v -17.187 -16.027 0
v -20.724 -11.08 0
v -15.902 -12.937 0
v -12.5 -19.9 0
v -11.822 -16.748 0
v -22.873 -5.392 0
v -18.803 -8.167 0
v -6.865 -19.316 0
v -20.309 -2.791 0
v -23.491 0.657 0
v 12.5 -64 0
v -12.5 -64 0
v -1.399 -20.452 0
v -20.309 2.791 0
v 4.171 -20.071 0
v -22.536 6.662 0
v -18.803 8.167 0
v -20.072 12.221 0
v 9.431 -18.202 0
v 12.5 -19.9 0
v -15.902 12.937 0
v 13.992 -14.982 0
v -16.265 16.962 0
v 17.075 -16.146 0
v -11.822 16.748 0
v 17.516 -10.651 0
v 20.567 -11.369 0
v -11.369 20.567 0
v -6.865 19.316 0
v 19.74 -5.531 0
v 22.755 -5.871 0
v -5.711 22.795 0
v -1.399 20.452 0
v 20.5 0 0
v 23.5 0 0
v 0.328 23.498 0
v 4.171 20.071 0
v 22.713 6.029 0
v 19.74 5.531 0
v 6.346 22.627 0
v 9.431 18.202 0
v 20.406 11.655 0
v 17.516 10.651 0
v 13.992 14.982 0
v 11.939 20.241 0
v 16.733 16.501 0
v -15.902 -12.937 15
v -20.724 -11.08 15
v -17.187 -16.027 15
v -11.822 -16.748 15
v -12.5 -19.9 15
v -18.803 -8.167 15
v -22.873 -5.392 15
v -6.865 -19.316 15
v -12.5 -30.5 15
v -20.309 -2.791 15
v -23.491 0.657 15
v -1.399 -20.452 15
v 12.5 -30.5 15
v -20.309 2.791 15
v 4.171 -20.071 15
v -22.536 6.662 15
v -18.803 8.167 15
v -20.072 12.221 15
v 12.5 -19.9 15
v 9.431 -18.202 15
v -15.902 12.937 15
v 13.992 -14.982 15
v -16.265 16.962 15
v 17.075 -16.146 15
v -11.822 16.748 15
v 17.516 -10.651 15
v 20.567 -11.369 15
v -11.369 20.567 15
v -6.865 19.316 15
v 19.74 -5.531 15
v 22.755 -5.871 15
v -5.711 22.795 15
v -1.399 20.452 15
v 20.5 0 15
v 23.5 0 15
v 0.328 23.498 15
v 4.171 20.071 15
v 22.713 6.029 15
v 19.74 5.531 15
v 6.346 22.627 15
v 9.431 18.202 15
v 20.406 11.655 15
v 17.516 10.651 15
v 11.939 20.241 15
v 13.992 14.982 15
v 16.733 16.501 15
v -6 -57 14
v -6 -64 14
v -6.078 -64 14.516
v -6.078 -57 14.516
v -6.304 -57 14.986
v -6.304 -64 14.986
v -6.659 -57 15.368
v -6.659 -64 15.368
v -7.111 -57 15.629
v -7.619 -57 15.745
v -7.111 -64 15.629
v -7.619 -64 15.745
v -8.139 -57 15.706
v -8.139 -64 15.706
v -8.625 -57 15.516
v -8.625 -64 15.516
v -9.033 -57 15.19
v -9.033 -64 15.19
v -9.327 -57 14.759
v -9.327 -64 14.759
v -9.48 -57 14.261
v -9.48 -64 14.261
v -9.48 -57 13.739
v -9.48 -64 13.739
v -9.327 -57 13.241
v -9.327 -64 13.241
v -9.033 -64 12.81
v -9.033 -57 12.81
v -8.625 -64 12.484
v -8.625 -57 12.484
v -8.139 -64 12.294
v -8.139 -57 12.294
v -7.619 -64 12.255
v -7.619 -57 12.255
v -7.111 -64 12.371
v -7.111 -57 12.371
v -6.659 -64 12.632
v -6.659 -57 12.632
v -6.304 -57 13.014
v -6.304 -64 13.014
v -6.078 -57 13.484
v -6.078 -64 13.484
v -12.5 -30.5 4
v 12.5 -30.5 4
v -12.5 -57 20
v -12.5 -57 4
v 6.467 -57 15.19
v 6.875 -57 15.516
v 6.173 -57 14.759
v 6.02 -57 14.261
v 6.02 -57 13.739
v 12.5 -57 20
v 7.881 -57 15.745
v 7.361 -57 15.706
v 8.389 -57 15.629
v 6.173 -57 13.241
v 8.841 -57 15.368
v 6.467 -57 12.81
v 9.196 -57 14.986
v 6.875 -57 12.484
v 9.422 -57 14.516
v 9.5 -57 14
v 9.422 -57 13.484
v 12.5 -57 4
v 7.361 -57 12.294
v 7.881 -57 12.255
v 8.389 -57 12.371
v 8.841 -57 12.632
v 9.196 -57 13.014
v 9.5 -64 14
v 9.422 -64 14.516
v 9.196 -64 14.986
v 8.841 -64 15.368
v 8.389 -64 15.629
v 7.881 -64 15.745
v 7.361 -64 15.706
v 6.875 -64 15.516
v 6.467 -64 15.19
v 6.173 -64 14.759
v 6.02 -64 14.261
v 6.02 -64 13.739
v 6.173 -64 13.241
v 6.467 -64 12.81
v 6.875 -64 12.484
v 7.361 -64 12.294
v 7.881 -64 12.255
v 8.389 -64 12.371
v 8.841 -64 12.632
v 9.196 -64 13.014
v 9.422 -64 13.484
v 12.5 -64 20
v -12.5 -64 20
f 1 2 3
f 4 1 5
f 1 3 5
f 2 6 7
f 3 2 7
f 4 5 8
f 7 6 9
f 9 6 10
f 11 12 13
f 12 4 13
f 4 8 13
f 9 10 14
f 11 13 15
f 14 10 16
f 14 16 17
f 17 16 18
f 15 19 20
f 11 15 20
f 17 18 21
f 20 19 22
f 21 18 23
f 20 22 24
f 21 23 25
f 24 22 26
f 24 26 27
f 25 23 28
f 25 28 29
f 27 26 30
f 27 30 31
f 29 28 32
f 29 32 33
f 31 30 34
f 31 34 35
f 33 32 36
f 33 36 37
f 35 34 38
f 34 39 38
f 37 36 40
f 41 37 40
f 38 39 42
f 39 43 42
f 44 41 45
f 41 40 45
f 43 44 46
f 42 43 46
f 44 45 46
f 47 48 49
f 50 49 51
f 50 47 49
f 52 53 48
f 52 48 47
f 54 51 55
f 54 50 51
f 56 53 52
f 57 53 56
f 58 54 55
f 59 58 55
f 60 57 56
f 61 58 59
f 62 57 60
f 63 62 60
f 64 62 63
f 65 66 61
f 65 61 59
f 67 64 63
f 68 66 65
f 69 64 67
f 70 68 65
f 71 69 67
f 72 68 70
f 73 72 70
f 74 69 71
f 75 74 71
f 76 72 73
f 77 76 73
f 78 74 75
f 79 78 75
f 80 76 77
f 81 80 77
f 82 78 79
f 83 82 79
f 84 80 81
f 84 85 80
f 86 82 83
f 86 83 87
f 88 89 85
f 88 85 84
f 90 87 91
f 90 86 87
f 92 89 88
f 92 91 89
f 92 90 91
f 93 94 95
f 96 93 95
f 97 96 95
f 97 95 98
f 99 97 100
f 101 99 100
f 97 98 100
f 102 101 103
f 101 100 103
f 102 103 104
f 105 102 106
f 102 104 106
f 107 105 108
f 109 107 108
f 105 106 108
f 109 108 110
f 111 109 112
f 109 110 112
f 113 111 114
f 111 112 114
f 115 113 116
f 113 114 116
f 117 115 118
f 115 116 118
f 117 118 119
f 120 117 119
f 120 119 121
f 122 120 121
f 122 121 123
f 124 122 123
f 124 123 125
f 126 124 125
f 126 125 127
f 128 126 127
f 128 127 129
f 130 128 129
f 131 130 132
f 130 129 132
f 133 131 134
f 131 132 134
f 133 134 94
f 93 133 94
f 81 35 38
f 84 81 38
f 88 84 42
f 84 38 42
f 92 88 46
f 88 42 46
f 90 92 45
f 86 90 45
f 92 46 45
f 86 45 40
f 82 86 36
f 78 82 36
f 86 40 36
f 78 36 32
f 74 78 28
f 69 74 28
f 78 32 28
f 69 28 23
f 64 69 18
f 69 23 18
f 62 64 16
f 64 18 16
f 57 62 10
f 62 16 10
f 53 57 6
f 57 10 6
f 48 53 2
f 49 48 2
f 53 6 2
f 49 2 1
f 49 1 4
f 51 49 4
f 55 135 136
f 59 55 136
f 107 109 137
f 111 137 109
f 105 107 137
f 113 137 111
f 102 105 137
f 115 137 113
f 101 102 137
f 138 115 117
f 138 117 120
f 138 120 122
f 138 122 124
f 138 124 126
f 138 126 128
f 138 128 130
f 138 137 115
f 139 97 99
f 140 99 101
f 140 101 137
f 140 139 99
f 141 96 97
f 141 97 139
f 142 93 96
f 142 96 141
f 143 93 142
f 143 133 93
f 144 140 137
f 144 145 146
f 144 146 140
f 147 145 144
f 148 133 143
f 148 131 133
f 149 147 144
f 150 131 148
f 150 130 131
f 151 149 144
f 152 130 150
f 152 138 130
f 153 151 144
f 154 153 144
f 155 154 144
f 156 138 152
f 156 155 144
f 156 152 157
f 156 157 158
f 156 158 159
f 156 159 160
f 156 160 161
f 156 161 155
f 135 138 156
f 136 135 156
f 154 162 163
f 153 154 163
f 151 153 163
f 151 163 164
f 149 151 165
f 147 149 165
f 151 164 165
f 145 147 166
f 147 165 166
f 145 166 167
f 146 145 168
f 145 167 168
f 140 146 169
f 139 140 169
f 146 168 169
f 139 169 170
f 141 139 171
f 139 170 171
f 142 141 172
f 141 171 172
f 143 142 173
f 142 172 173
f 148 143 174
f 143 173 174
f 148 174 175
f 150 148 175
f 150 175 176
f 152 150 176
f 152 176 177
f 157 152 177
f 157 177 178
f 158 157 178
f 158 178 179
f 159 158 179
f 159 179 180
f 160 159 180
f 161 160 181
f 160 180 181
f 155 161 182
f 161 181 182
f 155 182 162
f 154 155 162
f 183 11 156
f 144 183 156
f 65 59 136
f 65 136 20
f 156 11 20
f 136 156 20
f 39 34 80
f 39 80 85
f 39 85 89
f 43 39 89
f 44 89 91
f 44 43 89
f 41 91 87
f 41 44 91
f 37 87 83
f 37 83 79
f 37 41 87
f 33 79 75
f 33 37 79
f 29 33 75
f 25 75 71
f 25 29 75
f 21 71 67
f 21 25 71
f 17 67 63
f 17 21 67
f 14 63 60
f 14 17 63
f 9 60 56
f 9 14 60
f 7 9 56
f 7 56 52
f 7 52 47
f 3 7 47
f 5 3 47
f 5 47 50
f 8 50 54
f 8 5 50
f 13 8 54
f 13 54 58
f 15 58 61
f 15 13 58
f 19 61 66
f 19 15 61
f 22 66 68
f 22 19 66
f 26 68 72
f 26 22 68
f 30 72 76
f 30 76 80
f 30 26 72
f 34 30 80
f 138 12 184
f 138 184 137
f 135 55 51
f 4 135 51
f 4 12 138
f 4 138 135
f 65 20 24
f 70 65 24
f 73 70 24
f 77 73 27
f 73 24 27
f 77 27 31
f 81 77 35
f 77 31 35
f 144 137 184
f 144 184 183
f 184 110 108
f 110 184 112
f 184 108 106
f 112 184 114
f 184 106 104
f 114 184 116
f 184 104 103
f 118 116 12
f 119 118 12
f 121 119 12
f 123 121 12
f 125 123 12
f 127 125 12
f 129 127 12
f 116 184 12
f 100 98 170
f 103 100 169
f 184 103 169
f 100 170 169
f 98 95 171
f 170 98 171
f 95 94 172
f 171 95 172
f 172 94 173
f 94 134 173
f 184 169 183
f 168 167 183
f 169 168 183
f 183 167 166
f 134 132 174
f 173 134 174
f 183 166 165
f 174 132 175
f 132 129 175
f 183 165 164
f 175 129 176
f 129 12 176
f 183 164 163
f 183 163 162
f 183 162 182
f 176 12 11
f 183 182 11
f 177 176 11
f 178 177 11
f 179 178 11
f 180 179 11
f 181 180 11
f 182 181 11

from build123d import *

# Parameters (mm, degrees)
F0_R     = 20.5
F1_DEPTH = 15
F0_W     = 25
F0_H     = 26.5
F2_DEPTH = 4
F0_H_2   = 7
F3_DEPTH = 20
F4_R     = 1.75
F5_DEPTH = 7


# Not quite as in the source:
# - a feature names something its author has since deleted; it is built from what else it names


with BuildPart() as f1:
    # F0 (on Top) → F1 (new body)
    with BuildSketch(Plane.XY):
        with BuildLine():
            ThreePointArc((12.5, -19.8997487421), (0, -23.5), (-12.5, -19.8997487421))
            Line((-12.5, -19.8997487421), (-12.5, -30.5))
            Line((-12.5, -30.5), (12.5, -30.5))
            Line((12.5, -30.5), (12.5, -19.8997487421))
        make_face()
        with BuildLine():
            ThreePointArc((23.5, 0), (-11.3688170009, 20.5669638012), (-12.5, -19.8997487421))
            ThreePointArc((-12.5, -19.8997487421), (0, -23.5), (12.5, -19.8997487421))
            ThreePointArc((12.5, -19.8997487421), (20.5669638012, -11.3688170009), (23.5, 0))
        make_face()
        Circle(F0_R, mode=Mode.SUBTRACT)
    extrude(amount=F1_DEPTH)

    # F0 (on Top) → F2 (join)
    with BuildSketch(Plane.XY):
        with BuildLine():
            ThreePointArc((12.5, -19.8997487421), (0, -23.5), (-12.5, -19.8997487421))
            Line((-12.5, -19.8997487421), (-12.5, -30.5))
            Line((-12.5, -30.5), (12.5, -30.5))
            Line((12.5, -30.5), (12.5, -19.8997487421))
        make_face()
        with Locations((0, -43.75)):
            Rectangle(F0_W, F0_H)
    extrude(amount=F2_DEPTH)

    # F0 (on Top) → F3 (join)
    with BuildSketch(Plane.XY):
        with Locations((0, -60.5)):
            Rectangle(F0_W, F0_H_2)
    extrude(amount=F3_DEPTH)

    # F4 (on face) → F5 (cut, through all)
    with BuildSketch(Plane.XZ.offset(64)):
        with Locations((-7.75, 14)):
            Circle(F4_R)
        with Locations((7.75, 14)):
            Circle(F4_R)
    extrude(amount=-F5_DEPTH, mode=Mode.SUBTRACT)


solid = f1.part
